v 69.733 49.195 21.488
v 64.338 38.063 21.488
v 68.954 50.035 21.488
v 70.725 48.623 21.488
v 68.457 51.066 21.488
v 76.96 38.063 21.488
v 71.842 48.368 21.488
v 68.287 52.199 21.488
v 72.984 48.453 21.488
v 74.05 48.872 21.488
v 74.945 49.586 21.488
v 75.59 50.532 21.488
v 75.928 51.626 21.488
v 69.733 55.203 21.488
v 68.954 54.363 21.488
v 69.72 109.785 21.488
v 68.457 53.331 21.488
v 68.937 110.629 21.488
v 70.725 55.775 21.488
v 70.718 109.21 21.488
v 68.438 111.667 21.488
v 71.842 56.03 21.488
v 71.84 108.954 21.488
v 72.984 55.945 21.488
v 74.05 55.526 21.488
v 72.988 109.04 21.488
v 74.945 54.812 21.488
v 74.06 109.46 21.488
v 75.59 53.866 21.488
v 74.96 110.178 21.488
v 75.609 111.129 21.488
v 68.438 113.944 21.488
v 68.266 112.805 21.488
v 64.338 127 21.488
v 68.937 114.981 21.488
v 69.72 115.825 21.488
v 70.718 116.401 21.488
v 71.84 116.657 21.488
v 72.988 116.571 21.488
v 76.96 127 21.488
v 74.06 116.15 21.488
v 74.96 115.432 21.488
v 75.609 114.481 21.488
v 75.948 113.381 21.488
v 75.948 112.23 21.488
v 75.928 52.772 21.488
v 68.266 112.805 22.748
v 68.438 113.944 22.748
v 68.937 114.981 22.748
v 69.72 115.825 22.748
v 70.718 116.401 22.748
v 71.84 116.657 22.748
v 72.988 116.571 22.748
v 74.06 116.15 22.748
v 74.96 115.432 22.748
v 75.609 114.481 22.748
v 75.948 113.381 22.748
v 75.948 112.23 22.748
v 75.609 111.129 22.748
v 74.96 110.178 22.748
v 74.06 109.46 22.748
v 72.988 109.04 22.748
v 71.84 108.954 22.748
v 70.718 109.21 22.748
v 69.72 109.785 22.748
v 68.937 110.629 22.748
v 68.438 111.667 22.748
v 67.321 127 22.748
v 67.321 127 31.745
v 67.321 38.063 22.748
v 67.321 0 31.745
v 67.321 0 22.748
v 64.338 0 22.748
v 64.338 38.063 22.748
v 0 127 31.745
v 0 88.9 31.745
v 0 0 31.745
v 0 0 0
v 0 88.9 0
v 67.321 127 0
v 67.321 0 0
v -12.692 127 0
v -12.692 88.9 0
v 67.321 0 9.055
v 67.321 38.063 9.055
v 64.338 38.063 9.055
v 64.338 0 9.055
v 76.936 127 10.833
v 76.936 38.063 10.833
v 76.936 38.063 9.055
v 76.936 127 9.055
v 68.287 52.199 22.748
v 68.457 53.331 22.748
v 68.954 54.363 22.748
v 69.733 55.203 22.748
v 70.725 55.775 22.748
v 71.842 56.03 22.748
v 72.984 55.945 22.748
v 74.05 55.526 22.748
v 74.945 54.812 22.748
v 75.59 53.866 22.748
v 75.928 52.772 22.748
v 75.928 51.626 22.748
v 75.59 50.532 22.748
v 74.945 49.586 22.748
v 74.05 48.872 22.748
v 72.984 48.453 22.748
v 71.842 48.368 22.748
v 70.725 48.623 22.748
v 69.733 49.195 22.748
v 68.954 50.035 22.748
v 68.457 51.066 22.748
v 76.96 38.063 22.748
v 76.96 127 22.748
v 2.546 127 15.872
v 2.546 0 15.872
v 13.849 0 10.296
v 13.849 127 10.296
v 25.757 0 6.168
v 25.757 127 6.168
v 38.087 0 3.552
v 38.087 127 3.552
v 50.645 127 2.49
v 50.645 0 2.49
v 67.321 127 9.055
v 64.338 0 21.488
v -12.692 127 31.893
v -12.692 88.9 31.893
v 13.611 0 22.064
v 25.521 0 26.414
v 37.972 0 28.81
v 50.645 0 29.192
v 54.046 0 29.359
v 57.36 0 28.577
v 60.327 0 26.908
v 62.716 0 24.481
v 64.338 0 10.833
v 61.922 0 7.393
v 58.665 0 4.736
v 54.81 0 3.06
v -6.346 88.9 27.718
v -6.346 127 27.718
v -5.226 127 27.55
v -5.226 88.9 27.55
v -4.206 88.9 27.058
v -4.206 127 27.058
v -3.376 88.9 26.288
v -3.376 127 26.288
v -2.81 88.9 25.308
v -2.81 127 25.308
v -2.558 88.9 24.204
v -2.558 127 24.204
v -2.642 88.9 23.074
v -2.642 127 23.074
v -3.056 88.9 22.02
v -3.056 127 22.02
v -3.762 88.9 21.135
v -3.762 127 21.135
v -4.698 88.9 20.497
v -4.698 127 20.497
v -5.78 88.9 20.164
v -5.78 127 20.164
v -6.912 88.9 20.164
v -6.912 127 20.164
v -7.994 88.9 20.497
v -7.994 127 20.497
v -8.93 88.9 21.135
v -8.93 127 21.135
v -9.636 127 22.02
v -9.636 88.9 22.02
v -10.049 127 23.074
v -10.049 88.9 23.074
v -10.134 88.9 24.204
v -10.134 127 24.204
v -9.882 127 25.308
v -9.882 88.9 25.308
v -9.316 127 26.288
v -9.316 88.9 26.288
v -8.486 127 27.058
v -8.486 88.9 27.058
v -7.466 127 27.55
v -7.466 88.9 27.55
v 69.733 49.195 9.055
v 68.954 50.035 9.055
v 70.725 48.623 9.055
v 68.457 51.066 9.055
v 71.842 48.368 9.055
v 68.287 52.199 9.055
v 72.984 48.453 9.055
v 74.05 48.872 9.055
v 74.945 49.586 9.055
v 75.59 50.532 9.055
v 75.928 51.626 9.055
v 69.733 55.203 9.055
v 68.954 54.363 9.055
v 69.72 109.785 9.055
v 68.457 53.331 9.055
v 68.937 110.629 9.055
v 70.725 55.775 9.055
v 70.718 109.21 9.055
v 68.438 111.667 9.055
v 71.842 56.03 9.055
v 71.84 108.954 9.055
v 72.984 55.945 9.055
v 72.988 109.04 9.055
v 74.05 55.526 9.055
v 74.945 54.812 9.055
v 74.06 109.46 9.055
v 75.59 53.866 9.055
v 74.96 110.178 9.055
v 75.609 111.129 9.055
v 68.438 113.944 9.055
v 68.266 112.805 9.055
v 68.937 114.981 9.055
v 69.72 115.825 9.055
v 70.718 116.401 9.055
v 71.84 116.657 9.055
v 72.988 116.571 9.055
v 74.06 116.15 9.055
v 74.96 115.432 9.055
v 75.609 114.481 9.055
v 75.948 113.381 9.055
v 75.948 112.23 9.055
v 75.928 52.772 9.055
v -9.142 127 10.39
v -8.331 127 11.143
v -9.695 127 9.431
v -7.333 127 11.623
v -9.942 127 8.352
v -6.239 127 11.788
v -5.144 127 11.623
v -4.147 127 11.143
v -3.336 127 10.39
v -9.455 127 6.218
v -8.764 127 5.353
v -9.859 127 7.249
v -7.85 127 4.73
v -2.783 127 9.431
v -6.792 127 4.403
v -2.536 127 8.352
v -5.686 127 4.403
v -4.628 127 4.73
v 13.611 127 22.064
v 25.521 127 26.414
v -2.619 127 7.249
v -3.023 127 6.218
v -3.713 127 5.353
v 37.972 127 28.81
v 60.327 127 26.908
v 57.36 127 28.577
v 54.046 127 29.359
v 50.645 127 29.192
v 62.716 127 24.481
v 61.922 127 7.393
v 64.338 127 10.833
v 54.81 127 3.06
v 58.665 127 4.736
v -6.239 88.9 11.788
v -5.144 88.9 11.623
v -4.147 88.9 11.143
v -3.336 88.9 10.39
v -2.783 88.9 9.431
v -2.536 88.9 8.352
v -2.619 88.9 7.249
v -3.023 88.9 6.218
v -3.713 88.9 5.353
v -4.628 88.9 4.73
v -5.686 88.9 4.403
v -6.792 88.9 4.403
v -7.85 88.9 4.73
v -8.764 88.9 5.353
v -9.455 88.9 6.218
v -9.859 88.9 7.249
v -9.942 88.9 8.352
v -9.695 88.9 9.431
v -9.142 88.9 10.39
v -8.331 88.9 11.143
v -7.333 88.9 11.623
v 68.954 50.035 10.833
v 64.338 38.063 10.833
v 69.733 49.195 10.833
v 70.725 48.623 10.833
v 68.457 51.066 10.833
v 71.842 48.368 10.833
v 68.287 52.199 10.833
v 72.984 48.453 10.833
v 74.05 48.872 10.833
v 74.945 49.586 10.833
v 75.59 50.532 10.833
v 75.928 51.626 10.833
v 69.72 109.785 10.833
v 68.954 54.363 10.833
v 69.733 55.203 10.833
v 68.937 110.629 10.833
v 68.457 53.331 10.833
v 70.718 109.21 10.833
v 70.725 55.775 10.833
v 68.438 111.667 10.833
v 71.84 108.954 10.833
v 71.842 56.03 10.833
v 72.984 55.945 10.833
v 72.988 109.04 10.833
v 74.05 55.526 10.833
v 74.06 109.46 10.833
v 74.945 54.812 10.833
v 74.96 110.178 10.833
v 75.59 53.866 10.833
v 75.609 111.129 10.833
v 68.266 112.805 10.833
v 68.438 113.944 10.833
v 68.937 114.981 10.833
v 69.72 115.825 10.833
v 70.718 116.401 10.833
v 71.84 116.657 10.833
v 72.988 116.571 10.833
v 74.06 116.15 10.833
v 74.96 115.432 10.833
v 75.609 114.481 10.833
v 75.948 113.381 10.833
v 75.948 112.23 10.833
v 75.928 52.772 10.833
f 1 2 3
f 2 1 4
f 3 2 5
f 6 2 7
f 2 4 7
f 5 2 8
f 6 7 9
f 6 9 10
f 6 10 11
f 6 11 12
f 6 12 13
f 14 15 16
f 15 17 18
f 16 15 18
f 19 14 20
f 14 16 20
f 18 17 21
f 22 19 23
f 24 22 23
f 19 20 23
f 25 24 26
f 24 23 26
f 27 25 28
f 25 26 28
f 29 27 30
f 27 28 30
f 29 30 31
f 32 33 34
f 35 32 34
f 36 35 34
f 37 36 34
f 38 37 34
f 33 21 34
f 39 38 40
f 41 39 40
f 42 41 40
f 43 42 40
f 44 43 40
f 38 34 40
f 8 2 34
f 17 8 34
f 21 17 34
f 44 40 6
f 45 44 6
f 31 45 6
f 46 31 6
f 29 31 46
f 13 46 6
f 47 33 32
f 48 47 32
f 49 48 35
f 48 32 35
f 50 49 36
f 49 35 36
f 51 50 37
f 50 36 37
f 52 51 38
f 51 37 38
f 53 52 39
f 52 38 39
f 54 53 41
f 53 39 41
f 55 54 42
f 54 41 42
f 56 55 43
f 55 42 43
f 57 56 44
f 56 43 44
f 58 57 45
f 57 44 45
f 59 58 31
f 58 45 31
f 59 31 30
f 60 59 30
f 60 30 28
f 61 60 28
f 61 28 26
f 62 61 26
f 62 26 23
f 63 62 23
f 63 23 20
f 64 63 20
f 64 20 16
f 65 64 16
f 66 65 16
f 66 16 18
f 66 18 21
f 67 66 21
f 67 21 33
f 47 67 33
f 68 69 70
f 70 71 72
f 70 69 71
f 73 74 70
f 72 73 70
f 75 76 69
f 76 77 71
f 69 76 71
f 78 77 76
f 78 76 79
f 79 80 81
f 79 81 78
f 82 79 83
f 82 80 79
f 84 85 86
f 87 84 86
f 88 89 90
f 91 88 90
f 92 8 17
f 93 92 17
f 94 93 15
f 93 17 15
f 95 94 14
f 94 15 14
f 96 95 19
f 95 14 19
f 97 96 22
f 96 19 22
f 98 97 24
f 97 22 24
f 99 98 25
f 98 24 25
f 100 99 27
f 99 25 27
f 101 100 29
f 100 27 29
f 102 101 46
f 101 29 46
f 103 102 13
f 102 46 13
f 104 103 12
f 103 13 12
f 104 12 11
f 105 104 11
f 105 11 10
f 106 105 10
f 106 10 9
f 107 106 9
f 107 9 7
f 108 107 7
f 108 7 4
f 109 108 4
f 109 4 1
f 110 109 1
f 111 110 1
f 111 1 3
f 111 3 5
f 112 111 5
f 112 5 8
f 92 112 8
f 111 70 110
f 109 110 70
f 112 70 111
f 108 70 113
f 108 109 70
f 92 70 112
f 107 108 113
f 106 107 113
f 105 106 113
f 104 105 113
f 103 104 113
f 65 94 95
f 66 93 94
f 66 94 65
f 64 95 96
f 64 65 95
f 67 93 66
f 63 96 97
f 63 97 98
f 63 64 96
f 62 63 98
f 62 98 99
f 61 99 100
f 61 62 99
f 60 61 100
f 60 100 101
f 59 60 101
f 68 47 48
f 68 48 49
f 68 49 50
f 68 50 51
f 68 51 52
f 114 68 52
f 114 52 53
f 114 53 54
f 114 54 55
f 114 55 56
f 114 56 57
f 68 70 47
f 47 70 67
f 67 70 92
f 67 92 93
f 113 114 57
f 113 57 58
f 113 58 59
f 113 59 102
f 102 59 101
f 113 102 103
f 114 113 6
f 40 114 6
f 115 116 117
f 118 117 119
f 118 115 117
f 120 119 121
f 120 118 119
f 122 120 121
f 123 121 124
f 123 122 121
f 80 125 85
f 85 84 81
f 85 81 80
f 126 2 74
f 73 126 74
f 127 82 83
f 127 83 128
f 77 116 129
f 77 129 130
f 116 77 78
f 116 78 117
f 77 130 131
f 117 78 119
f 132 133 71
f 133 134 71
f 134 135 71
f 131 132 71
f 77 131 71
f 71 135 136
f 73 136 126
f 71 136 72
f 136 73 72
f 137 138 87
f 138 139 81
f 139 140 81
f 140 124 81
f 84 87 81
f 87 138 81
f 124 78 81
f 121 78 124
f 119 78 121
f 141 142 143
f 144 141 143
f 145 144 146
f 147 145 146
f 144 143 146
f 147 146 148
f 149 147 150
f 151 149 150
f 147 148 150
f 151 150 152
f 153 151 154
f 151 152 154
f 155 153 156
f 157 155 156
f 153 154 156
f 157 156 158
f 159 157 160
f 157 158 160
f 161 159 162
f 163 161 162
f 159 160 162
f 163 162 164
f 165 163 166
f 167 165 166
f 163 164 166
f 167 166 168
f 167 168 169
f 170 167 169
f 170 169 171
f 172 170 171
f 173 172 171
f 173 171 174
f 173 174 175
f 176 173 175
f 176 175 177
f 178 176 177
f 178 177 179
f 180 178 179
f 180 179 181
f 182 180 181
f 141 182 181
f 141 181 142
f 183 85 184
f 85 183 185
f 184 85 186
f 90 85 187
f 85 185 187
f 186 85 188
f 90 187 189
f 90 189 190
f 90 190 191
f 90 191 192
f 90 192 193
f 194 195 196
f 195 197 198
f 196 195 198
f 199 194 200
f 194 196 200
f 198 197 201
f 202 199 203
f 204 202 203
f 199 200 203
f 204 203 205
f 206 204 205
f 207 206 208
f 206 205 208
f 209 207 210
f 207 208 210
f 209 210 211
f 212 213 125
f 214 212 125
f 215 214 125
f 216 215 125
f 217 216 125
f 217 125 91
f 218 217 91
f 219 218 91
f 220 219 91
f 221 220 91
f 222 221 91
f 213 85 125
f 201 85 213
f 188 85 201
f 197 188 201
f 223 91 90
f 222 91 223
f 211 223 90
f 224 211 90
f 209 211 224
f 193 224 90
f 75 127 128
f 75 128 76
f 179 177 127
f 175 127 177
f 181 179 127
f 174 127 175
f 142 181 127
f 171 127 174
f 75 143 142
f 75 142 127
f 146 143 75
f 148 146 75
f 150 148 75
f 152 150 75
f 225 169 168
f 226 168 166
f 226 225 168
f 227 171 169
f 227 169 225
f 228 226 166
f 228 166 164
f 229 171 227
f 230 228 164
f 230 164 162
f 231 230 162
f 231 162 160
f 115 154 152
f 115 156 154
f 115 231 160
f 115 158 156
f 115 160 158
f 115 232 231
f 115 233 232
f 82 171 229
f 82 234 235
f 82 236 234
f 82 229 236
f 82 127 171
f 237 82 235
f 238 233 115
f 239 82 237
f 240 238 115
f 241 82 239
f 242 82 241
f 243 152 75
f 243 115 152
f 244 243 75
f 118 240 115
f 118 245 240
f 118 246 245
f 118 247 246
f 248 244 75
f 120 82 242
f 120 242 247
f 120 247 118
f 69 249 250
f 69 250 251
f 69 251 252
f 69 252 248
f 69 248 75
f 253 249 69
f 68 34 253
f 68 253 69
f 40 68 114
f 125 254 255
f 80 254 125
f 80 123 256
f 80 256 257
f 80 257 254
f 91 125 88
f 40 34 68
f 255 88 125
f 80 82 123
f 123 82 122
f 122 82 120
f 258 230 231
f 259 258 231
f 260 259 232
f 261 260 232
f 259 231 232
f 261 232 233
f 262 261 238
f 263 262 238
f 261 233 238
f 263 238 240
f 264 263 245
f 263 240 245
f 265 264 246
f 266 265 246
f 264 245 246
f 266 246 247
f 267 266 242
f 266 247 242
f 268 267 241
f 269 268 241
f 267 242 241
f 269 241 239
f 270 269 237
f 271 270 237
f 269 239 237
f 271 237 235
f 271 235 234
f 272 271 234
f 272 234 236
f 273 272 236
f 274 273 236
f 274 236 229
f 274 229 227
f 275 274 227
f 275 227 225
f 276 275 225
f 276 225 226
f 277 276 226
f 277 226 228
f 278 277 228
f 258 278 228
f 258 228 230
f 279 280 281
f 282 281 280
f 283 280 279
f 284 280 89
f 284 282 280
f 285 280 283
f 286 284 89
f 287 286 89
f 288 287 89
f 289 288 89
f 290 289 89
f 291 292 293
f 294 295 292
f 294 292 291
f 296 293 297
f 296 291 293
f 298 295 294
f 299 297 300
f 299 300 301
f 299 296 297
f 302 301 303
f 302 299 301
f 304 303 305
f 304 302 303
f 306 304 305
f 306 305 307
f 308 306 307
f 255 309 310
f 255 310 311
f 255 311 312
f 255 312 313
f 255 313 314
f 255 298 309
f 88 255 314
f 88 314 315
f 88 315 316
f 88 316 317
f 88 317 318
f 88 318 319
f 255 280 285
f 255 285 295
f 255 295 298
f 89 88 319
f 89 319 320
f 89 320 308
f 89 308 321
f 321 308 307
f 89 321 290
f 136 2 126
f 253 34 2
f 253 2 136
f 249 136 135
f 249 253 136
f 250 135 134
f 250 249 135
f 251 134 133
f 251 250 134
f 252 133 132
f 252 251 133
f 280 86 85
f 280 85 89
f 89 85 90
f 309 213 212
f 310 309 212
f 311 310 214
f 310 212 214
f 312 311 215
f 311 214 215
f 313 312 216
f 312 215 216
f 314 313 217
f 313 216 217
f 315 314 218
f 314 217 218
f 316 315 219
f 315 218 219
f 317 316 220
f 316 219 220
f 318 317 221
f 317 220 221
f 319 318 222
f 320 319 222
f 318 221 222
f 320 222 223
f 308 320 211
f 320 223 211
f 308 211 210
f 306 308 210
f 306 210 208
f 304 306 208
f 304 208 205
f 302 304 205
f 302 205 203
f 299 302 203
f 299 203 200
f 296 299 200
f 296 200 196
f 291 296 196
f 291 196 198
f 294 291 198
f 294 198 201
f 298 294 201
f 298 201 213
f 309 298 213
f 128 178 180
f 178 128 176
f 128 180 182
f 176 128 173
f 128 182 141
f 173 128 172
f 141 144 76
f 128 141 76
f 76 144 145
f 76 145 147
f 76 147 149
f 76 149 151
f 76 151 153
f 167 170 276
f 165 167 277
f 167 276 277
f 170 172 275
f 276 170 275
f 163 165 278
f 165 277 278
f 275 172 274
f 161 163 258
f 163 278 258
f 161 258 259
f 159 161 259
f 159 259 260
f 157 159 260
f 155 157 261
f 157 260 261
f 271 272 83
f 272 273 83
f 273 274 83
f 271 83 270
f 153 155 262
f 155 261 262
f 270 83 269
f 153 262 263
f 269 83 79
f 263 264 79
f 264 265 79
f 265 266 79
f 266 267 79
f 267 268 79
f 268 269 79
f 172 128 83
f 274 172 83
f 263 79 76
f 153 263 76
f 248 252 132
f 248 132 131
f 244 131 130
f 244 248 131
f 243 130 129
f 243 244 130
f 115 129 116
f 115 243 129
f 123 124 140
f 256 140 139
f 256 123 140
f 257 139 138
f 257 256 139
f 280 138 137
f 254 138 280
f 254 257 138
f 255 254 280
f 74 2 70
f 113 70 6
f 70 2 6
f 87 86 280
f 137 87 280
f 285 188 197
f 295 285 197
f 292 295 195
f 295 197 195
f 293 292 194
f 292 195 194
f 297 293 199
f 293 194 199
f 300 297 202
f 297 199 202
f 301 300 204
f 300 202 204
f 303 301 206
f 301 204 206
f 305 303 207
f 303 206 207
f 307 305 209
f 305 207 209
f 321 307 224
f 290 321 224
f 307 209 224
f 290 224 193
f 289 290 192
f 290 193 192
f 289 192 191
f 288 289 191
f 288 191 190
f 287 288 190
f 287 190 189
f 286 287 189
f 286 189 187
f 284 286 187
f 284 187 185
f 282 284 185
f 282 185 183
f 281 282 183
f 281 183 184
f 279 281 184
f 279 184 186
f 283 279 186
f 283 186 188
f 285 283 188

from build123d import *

# Parameters (mm, degrees)
SKETCH1_W           = 67.320921889
SKETCH1_H           = 31.744824956
BOSS_EXTRUDE1_DEPTH = 127
BOSS_EXTRUDE2_DEPTH = 38.1
SKETCH3_R           = 3.798675559
CUT_EXTRUDE1_DEPTH  = 53.34
SKETCH4_R           = 3.713025355
CUT_EXTRUDE2_DEPTH  = 72.898
CUT_EXTRUDE3_DEPTH  = 177.8
CUT_EXTRUDE4_DEPTH  = 140.752657
SKETCH7_W           = 12.598265338
SKETCH7_H           = 1.777860749
BOSS_EXTRUDE3_DEPTH = 88.936657
SKETCH8_W           = 12.621827424
SKETCH8_H           = 1.259783395
BOSS_EXTRUDE4_DEPTH = 88.936657
SKETCH9_R           = 3.862443539
CUT_EXTRUDE5_DEPTH  = 31.278657
SKETCH10_R          = 3.842033399
CUT_EXTRUDE6_DEPTH  = 32.548657


with BuildPart() as part:
    # Sketch1 → Boss-Extrude1 (new body)
    with BuildSketch(Plane(origin=(0, 0, 0), x_dir=(1, 0, 0), z_dir=(0, 1, 0))):
        with Locations((33.660460945, -15.872412478)):
            Rectangle(SKETCH1_W, SKETCH1_H)
    extrude(amount=BOSS_EXTRUDE1_DEPTH)

    # Sketch2 → Boss-Extrude2 (add)
    with BuildSketch(Plane(origin=(0, 127, 0), x_dir=(1, 0, 0), z_dir=(0, 1, 0))):
        Polygon((0, 0), (-12.691812955, 0), (-12.691812955, -31.893008725), (0, -31.744824956), align=None)
    extrude(amount=-BOSS_EXTRUDE2_DEPTH)

    # Sketch3 → Cut-Extrude1 (cut)
    with BuildSketch(Plane(origin=(0, 127, 0), x_dir=(1, 0, 0), z_dir=(0, 1, 0))):
        with Locations(Location((-6.345906477, -23.919756544, 0), (0, 0, 270))):
            Circle(SKETCH3_R)
    extrude(amount=-CUT_EXTRUDE1_DEPTH, mode=Mode.SUBTRACT)

    # Sketch4 → Cut-Extrude2 (cut)
    with BuildSketch(Plane(origin=(0, 127, 0), x_dir=(1, 0, 0), z_dir=(0, 1, 0))):
        with Locations(Location((-6.238928802, -8.074927798, 0), (0, 0, 270))):
            Circle(SKETCH4_R)
    extrude(amount=-CUT_EXTRUDE2_DEPTH, mode=Mode.SUBTRACT)

    # Sketch5 → Cut-Extrude3 (cut)
    with BuildSketch(Plane(origin=(0, 127, 0), x_dir=(1, 0, 0), z_dir=(0, 1, 0))):
        with BuildLine():
            ThreePointArc((64.884408785, -12.014730435), (65.337632333, -15.775676375), (64.884408785, -19.536622316))
            ThreePointArc((64.884408785, -19.536622316), (59.764565977, -27.313148833), (50.645455775, -29.191707899))
            ThreePointArc((50.645455775, -29.191707899), (25.520797189, -26.413912497), (2.545998088, -15.872412478))
            ThreePointArc((2.545998088, -15.872412478), (25.757322084, -6.167748294), (50.645455775, -2.489858962))
            ThreePointArc((50.645455775, -2.489858962), (59.21392875, -5.086156005), (64.884408785, -12.014730435))
        make_face()
    extrude(amount=-CUT_EXTRUDE3_DEPTH, mode=Mode.SUBTRACT)

    # Sketch6 → Cut-Extrude4 (cut)
    with BuildSketch(Plane(origin=(0, 127, 0), x_dir=(1, 0, 0), z_dir=(0, 1, 0))):
        Polygon((64.338150371, -15.872412478), (64.338150371, -22.747923603), (67.320921889, -22.747923603), (67.320921889, -9.054734185), (64.338150371, -9.054734185), align=None)
    extrude(amount=-CUT_EXTRUDE4_DEPTH, mode=Mode.SUBTRACT)

    # Sketch7 → Boss-Extrude3 (add)
    with BuildSketch(Plane(origin=(0, 127, 0), x_dir=(1, 0, 0), z_dir=(0, 1, 0))):
        with Locations((70.63728304, -9.94366456)):
            Rectangle(SKETCH7_W, SKETCH7_H)
    extrude(amount=-BOSS_EXTRUDE3_DEPTH)

    # Sketch8 → Boss-Extrude4 (add)
    with BuildSketch(Plane(origin=(0, 127, 0), x_dir=(1, 0, 0), z_dir=(0, 1, 0))):
        with Locations((70.649064083, -22.118031906)):
            Rectangle(SKETCH8_W, SKETCH8_H)
    extrude(amount=-BOSS_EXTRUDE4_DEPTH)

    # Sketch9 → Cut-Extrude5 (cut)
    with BuildSketch(Plane(origin=(0, 0, 9.054734185), x_dir=(-1, 0, 0), z_dir=(0, 0, -1))):
        with Locations((-72.128668799, 112.805210201)):
            Circle(SKETCH9_R)
    extrude(amount=-CUT_EXTRUDE5_DEPTH, mode=Mode.SUBTRACT)

    # Sketch10 → Cut-Extrude6 (cut)
    with BuildSketch(Plane(origin=(0, 0, 9.054734185), x_dir=(-1, 0, 0), z_dir=(0, 0, -1))):
        with Locations((-72.128668799, 52.198950376)):
            Circle(SKETCH10_R)
    extrude(amount=-CUT_EXTRUDE6_DEPTH, mode=Mode.SUBTRACT)


solid = part.part
